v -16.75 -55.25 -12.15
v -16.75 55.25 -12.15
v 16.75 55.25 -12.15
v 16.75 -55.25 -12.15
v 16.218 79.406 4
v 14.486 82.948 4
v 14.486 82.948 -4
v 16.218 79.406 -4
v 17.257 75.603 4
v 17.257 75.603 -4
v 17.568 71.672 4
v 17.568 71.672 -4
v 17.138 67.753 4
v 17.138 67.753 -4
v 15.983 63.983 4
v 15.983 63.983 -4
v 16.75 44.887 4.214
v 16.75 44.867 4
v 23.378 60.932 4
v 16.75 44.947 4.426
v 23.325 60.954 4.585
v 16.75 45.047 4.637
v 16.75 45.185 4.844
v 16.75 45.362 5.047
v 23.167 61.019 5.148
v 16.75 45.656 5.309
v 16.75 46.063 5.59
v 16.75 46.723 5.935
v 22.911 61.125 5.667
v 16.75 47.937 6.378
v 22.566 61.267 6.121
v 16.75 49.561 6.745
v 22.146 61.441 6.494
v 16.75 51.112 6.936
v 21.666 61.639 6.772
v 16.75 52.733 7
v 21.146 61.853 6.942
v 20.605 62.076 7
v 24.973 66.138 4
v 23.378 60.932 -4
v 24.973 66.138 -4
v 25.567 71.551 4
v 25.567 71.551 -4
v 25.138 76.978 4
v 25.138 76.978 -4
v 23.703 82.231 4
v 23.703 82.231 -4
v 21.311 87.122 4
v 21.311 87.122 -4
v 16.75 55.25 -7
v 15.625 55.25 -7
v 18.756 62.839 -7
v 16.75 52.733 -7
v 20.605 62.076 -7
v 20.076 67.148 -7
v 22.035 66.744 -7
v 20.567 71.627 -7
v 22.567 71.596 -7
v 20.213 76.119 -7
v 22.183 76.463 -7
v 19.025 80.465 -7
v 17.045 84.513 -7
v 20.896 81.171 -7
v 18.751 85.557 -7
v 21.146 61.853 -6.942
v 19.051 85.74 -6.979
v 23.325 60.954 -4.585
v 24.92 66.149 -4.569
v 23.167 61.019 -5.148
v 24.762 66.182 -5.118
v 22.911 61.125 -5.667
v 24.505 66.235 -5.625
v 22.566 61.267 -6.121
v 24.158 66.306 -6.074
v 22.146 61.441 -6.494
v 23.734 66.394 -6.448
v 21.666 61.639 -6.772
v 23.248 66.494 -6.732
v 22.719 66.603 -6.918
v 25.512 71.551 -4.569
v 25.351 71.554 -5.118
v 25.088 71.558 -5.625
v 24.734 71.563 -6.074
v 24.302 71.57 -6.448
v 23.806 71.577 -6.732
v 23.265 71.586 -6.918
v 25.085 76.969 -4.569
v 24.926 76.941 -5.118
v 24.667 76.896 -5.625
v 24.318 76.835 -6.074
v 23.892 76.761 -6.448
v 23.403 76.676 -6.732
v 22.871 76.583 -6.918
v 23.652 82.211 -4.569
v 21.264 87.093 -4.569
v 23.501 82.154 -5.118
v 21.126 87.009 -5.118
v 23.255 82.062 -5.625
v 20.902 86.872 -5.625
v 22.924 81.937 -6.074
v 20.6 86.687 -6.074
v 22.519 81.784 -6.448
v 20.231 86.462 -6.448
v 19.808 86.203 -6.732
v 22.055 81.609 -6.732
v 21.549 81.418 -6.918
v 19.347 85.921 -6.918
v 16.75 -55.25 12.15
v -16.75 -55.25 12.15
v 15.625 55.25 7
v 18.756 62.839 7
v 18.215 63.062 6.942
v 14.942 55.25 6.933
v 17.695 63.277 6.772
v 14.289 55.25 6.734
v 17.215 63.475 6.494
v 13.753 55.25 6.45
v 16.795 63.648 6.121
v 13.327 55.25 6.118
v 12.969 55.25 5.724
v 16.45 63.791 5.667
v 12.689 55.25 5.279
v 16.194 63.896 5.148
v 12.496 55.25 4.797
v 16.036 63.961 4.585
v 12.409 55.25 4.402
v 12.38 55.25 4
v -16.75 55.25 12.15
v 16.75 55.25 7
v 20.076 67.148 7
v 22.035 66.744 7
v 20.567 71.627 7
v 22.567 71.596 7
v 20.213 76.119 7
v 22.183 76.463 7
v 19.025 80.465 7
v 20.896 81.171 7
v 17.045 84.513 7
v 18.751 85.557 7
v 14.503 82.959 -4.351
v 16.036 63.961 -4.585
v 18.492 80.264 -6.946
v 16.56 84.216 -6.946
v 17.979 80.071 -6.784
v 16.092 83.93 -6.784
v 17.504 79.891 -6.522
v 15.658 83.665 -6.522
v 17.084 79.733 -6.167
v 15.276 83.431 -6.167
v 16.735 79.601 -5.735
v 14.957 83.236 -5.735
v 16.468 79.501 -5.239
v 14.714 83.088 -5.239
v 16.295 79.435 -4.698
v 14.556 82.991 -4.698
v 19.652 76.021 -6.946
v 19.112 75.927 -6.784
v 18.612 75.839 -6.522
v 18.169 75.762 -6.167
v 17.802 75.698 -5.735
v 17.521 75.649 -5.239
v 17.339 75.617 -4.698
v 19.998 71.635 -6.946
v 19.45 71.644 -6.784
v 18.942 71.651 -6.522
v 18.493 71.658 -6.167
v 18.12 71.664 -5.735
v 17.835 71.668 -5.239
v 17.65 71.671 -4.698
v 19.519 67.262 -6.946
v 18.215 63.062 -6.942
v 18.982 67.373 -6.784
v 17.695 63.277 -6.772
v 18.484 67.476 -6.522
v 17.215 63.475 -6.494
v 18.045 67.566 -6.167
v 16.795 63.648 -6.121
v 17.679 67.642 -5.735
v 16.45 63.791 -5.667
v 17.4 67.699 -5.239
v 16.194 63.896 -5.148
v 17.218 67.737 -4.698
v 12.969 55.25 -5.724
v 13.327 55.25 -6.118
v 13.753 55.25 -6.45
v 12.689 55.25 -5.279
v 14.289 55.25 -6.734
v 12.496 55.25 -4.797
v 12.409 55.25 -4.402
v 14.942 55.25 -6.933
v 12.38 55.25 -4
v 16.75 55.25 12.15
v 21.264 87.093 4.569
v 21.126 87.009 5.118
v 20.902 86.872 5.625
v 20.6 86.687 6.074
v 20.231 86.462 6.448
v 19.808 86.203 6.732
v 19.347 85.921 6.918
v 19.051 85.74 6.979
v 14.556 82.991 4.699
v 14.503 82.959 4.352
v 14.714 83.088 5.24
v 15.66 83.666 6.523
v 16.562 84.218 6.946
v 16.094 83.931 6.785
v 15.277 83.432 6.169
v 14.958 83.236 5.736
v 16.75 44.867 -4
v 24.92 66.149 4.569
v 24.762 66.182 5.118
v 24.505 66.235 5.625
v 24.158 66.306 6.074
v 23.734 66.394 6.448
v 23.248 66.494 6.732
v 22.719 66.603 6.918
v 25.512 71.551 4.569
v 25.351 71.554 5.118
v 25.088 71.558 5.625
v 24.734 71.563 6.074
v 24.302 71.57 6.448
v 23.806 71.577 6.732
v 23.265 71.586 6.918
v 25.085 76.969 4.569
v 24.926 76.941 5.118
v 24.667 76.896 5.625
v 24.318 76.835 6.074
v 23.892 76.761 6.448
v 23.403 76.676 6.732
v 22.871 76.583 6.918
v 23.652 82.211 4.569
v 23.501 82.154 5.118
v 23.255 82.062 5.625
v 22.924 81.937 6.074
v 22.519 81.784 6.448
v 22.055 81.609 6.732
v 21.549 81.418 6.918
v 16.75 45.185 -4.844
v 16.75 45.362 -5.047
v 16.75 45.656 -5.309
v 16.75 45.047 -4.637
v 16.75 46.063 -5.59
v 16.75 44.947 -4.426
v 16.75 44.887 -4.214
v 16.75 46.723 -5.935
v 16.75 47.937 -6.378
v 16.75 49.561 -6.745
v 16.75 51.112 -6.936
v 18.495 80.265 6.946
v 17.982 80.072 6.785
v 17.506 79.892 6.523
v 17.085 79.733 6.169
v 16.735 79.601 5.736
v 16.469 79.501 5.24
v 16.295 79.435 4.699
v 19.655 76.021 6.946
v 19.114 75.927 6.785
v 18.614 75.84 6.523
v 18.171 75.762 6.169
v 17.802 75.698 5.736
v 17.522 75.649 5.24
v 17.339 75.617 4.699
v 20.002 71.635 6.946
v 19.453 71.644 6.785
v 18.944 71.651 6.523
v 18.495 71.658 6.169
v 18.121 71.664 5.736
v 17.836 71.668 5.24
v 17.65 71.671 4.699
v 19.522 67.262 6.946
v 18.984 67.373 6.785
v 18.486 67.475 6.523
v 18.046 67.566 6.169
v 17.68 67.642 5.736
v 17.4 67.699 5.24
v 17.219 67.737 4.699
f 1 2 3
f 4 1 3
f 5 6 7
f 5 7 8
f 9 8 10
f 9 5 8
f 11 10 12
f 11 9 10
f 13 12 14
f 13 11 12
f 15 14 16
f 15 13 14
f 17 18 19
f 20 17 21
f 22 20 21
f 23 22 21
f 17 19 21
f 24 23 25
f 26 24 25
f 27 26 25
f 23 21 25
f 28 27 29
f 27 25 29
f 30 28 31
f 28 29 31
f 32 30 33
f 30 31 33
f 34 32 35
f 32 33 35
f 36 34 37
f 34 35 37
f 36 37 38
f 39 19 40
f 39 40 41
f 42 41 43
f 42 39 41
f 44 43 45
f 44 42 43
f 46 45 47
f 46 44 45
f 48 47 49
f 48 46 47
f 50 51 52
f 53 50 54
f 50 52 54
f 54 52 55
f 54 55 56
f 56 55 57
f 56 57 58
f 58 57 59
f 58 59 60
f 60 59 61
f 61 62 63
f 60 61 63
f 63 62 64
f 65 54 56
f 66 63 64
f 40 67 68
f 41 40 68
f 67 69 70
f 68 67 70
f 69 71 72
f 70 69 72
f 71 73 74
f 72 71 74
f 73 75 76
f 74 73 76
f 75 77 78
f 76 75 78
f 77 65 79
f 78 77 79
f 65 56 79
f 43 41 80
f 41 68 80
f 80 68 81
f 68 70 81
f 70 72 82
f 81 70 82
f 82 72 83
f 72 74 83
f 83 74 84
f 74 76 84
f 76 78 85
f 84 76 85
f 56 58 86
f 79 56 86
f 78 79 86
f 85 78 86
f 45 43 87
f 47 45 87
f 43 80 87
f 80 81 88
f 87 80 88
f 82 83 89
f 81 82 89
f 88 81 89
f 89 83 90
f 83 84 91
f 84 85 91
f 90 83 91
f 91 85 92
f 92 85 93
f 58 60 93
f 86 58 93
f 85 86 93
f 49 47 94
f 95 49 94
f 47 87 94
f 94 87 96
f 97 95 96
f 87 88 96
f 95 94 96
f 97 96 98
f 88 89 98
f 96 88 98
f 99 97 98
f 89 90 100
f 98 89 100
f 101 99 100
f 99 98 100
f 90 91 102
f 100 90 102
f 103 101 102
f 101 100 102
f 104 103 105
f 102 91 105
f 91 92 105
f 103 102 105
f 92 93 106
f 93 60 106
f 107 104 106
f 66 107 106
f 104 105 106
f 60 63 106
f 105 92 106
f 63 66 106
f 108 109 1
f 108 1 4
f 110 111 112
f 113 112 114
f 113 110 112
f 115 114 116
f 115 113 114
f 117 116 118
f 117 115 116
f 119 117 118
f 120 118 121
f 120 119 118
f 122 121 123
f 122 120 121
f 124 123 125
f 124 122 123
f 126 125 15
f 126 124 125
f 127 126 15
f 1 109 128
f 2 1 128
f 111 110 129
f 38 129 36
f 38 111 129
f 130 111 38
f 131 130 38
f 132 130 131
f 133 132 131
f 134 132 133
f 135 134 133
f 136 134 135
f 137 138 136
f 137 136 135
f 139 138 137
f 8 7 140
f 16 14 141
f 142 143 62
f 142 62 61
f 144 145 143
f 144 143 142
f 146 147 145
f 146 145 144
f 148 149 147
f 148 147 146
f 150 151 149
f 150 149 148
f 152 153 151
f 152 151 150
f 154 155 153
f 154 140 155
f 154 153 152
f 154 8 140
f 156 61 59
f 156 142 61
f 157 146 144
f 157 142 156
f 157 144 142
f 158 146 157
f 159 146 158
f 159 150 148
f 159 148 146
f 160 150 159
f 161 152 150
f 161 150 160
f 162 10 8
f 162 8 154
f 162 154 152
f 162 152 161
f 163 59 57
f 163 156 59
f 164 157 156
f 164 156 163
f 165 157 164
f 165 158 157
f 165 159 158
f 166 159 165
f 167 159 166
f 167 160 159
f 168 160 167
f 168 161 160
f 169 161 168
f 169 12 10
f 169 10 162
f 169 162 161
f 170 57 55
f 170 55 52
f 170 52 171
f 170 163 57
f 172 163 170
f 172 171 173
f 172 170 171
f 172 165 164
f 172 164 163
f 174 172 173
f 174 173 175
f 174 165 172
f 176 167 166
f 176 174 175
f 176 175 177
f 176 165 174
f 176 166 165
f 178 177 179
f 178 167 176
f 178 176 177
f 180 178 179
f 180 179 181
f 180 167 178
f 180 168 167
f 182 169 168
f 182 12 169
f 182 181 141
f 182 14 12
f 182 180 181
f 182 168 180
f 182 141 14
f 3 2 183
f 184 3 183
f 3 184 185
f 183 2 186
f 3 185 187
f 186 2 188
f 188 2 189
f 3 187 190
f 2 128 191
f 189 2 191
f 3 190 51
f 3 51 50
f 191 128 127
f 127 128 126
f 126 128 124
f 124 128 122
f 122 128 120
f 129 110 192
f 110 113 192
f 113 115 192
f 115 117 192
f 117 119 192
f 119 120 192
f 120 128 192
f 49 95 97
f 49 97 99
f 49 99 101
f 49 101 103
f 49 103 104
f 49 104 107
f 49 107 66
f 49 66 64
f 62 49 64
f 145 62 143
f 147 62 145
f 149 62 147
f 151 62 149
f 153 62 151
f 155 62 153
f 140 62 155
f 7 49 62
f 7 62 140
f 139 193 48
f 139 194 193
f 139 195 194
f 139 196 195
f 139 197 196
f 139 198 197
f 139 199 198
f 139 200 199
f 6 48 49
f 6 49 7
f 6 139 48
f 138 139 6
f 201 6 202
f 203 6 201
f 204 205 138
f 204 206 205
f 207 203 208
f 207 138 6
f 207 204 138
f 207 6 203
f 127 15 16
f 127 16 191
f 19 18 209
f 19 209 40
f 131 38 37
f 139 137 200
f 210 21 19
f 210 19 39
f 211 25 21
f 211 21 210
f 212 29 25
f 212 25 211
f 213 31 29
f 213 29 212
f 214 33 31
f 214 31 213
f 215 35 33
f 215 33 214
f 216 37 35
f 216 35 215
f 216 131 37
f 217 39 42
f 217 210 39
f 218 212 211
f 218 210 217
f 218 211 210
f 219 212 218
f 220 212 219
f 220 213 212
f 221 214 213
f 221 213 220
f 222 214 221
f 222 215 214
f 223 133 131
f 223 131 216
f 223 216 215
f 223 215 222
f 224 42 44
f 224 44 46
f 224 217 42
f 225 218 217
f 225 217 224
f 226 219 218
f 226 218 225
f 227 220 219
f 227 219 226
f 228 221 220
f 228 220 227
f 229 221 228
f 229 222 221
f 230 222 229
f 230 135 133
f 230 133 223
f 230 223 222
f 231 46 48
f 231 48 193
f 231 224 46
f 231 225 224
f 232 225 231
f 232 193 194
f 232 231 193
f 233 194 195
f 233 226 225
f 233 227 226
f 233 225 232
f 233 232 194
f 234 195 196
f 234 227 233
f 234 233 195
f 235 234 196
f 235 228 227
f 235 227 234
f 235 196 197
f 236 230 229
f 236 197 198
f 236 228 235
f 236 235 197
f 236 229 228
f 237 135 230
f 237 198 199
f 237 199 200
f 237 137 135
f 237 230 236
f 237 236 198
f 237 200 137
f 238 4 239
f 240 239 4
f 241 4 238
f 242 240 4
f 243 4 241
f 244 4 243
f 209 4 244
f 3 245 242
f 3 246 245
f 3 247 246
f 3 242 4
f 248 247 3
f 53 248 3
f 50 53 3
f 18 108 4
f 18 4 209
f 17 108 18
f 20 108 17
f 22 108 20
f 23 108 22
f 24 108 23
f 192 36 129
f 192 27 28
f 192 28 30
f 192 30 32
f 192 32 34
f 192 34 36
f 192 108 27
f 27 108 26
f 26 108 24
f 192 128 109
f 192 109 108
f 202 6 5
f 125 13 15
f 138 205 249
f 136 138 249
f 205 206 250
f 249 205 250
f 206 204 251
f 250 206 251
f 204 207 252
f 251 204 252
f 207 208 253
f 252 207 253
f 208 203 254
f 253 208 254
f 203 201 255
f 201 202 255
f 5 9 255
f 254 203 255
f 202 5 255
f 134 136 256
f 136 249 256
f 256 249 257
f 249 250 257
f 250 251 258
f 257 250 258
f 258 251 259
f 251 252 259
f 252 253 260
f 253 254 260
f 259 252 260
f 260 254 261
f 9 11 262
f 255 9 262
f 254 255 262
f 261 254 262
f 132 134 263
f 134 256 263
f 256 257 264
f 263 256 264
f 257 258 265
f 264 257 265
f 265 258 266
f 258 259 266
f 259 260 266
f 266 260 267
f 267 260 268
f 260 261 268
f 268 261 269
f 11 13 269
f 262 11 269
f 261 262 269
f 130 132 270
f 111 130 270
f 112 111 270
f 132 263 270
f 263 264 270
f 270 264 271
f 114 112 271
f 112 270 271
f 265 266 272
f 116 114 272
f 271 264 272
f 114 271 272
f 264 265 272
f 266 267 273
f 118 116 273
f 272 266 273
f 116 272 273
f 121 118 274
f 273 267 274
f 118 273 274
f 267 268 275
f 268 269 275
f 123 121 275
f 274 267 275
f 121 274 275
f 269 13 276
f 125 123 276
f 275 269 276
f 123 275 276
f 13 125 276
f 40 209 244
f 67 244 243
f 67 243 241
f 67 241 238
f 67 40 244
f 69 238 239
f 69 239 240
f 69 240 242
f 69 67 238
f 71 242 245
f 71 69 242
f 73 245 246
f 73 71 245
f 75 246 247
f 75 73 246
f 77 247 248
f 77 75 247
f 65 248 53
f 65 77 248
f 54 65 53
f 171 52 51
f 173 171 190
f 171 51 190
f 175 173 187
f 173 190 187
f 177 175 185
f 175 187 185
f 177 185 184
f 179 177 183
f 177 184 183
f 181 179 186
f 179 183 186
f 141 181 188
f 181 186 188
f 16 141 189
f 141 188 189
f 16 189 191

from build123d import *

# Parameters (mm, degrees)
SKETCH1_W   = 33.5
SKETCH1_H   = 110.5
BODY_DEPTH  = 12.15
CABLE_DEPTH = 7
FILLET1_R   = 3


with BuildPart() as part:
    # Sketch1 → Body (new, symmetric)
    with BuildSketch(Plane.XY):
        Rectangle(SKETCH1_W, SKETCH1_H)
    extrude(amount=BODY_DEPTH, both=True)

    # Sketch2 → Cable (add, symmetric)
    with BuildSketch(Plane.XY):
        with BuildLine():
            Line((14.614768377, 39.692127969), (23.378177187, 60.932254406))
            ThreePointArc((23.378177187, 60.932254406), (25.480222235, 74.274540457), (21.310589844, 87.121694079))
            Line((21.310589844, 87.121694079), (14.485707158, 82.94784977))
            ThreePointArc((14.485707158, 82.94784977), (17.505037046, 73.644920573), (15.98289628, 63.98345422))
            Line((15.98289628, 63.98345422), (7.21948747, 42.743327783))
            Line((7.21948747, 42.743327783), (14.614768377, 39.692127969))
        make_face()
    extrude(amount=CABLE_DEPTH, both=True)

    # Fillet1
    fillet1_edges = [part.edges().sort_by_distance(p)[0] for p in [
        (20.064088593, 52.899802391, -7),
        (14.18123964, 59.61672711, 7),
        (20.064088593, 52.899802391, 7),
        (25.480222235, 74.274540457, 7),
        (14.18123964, 59.61672711, -7),
        (17.505037046, 73.644920573, -7),
        (25.480222235, 74.274540457, -7),
        (17.505037046, 73.644920573, 7),
    ]]
    fillet(fillet1_edges, radius=FILLET1_R)


solid = part.part
